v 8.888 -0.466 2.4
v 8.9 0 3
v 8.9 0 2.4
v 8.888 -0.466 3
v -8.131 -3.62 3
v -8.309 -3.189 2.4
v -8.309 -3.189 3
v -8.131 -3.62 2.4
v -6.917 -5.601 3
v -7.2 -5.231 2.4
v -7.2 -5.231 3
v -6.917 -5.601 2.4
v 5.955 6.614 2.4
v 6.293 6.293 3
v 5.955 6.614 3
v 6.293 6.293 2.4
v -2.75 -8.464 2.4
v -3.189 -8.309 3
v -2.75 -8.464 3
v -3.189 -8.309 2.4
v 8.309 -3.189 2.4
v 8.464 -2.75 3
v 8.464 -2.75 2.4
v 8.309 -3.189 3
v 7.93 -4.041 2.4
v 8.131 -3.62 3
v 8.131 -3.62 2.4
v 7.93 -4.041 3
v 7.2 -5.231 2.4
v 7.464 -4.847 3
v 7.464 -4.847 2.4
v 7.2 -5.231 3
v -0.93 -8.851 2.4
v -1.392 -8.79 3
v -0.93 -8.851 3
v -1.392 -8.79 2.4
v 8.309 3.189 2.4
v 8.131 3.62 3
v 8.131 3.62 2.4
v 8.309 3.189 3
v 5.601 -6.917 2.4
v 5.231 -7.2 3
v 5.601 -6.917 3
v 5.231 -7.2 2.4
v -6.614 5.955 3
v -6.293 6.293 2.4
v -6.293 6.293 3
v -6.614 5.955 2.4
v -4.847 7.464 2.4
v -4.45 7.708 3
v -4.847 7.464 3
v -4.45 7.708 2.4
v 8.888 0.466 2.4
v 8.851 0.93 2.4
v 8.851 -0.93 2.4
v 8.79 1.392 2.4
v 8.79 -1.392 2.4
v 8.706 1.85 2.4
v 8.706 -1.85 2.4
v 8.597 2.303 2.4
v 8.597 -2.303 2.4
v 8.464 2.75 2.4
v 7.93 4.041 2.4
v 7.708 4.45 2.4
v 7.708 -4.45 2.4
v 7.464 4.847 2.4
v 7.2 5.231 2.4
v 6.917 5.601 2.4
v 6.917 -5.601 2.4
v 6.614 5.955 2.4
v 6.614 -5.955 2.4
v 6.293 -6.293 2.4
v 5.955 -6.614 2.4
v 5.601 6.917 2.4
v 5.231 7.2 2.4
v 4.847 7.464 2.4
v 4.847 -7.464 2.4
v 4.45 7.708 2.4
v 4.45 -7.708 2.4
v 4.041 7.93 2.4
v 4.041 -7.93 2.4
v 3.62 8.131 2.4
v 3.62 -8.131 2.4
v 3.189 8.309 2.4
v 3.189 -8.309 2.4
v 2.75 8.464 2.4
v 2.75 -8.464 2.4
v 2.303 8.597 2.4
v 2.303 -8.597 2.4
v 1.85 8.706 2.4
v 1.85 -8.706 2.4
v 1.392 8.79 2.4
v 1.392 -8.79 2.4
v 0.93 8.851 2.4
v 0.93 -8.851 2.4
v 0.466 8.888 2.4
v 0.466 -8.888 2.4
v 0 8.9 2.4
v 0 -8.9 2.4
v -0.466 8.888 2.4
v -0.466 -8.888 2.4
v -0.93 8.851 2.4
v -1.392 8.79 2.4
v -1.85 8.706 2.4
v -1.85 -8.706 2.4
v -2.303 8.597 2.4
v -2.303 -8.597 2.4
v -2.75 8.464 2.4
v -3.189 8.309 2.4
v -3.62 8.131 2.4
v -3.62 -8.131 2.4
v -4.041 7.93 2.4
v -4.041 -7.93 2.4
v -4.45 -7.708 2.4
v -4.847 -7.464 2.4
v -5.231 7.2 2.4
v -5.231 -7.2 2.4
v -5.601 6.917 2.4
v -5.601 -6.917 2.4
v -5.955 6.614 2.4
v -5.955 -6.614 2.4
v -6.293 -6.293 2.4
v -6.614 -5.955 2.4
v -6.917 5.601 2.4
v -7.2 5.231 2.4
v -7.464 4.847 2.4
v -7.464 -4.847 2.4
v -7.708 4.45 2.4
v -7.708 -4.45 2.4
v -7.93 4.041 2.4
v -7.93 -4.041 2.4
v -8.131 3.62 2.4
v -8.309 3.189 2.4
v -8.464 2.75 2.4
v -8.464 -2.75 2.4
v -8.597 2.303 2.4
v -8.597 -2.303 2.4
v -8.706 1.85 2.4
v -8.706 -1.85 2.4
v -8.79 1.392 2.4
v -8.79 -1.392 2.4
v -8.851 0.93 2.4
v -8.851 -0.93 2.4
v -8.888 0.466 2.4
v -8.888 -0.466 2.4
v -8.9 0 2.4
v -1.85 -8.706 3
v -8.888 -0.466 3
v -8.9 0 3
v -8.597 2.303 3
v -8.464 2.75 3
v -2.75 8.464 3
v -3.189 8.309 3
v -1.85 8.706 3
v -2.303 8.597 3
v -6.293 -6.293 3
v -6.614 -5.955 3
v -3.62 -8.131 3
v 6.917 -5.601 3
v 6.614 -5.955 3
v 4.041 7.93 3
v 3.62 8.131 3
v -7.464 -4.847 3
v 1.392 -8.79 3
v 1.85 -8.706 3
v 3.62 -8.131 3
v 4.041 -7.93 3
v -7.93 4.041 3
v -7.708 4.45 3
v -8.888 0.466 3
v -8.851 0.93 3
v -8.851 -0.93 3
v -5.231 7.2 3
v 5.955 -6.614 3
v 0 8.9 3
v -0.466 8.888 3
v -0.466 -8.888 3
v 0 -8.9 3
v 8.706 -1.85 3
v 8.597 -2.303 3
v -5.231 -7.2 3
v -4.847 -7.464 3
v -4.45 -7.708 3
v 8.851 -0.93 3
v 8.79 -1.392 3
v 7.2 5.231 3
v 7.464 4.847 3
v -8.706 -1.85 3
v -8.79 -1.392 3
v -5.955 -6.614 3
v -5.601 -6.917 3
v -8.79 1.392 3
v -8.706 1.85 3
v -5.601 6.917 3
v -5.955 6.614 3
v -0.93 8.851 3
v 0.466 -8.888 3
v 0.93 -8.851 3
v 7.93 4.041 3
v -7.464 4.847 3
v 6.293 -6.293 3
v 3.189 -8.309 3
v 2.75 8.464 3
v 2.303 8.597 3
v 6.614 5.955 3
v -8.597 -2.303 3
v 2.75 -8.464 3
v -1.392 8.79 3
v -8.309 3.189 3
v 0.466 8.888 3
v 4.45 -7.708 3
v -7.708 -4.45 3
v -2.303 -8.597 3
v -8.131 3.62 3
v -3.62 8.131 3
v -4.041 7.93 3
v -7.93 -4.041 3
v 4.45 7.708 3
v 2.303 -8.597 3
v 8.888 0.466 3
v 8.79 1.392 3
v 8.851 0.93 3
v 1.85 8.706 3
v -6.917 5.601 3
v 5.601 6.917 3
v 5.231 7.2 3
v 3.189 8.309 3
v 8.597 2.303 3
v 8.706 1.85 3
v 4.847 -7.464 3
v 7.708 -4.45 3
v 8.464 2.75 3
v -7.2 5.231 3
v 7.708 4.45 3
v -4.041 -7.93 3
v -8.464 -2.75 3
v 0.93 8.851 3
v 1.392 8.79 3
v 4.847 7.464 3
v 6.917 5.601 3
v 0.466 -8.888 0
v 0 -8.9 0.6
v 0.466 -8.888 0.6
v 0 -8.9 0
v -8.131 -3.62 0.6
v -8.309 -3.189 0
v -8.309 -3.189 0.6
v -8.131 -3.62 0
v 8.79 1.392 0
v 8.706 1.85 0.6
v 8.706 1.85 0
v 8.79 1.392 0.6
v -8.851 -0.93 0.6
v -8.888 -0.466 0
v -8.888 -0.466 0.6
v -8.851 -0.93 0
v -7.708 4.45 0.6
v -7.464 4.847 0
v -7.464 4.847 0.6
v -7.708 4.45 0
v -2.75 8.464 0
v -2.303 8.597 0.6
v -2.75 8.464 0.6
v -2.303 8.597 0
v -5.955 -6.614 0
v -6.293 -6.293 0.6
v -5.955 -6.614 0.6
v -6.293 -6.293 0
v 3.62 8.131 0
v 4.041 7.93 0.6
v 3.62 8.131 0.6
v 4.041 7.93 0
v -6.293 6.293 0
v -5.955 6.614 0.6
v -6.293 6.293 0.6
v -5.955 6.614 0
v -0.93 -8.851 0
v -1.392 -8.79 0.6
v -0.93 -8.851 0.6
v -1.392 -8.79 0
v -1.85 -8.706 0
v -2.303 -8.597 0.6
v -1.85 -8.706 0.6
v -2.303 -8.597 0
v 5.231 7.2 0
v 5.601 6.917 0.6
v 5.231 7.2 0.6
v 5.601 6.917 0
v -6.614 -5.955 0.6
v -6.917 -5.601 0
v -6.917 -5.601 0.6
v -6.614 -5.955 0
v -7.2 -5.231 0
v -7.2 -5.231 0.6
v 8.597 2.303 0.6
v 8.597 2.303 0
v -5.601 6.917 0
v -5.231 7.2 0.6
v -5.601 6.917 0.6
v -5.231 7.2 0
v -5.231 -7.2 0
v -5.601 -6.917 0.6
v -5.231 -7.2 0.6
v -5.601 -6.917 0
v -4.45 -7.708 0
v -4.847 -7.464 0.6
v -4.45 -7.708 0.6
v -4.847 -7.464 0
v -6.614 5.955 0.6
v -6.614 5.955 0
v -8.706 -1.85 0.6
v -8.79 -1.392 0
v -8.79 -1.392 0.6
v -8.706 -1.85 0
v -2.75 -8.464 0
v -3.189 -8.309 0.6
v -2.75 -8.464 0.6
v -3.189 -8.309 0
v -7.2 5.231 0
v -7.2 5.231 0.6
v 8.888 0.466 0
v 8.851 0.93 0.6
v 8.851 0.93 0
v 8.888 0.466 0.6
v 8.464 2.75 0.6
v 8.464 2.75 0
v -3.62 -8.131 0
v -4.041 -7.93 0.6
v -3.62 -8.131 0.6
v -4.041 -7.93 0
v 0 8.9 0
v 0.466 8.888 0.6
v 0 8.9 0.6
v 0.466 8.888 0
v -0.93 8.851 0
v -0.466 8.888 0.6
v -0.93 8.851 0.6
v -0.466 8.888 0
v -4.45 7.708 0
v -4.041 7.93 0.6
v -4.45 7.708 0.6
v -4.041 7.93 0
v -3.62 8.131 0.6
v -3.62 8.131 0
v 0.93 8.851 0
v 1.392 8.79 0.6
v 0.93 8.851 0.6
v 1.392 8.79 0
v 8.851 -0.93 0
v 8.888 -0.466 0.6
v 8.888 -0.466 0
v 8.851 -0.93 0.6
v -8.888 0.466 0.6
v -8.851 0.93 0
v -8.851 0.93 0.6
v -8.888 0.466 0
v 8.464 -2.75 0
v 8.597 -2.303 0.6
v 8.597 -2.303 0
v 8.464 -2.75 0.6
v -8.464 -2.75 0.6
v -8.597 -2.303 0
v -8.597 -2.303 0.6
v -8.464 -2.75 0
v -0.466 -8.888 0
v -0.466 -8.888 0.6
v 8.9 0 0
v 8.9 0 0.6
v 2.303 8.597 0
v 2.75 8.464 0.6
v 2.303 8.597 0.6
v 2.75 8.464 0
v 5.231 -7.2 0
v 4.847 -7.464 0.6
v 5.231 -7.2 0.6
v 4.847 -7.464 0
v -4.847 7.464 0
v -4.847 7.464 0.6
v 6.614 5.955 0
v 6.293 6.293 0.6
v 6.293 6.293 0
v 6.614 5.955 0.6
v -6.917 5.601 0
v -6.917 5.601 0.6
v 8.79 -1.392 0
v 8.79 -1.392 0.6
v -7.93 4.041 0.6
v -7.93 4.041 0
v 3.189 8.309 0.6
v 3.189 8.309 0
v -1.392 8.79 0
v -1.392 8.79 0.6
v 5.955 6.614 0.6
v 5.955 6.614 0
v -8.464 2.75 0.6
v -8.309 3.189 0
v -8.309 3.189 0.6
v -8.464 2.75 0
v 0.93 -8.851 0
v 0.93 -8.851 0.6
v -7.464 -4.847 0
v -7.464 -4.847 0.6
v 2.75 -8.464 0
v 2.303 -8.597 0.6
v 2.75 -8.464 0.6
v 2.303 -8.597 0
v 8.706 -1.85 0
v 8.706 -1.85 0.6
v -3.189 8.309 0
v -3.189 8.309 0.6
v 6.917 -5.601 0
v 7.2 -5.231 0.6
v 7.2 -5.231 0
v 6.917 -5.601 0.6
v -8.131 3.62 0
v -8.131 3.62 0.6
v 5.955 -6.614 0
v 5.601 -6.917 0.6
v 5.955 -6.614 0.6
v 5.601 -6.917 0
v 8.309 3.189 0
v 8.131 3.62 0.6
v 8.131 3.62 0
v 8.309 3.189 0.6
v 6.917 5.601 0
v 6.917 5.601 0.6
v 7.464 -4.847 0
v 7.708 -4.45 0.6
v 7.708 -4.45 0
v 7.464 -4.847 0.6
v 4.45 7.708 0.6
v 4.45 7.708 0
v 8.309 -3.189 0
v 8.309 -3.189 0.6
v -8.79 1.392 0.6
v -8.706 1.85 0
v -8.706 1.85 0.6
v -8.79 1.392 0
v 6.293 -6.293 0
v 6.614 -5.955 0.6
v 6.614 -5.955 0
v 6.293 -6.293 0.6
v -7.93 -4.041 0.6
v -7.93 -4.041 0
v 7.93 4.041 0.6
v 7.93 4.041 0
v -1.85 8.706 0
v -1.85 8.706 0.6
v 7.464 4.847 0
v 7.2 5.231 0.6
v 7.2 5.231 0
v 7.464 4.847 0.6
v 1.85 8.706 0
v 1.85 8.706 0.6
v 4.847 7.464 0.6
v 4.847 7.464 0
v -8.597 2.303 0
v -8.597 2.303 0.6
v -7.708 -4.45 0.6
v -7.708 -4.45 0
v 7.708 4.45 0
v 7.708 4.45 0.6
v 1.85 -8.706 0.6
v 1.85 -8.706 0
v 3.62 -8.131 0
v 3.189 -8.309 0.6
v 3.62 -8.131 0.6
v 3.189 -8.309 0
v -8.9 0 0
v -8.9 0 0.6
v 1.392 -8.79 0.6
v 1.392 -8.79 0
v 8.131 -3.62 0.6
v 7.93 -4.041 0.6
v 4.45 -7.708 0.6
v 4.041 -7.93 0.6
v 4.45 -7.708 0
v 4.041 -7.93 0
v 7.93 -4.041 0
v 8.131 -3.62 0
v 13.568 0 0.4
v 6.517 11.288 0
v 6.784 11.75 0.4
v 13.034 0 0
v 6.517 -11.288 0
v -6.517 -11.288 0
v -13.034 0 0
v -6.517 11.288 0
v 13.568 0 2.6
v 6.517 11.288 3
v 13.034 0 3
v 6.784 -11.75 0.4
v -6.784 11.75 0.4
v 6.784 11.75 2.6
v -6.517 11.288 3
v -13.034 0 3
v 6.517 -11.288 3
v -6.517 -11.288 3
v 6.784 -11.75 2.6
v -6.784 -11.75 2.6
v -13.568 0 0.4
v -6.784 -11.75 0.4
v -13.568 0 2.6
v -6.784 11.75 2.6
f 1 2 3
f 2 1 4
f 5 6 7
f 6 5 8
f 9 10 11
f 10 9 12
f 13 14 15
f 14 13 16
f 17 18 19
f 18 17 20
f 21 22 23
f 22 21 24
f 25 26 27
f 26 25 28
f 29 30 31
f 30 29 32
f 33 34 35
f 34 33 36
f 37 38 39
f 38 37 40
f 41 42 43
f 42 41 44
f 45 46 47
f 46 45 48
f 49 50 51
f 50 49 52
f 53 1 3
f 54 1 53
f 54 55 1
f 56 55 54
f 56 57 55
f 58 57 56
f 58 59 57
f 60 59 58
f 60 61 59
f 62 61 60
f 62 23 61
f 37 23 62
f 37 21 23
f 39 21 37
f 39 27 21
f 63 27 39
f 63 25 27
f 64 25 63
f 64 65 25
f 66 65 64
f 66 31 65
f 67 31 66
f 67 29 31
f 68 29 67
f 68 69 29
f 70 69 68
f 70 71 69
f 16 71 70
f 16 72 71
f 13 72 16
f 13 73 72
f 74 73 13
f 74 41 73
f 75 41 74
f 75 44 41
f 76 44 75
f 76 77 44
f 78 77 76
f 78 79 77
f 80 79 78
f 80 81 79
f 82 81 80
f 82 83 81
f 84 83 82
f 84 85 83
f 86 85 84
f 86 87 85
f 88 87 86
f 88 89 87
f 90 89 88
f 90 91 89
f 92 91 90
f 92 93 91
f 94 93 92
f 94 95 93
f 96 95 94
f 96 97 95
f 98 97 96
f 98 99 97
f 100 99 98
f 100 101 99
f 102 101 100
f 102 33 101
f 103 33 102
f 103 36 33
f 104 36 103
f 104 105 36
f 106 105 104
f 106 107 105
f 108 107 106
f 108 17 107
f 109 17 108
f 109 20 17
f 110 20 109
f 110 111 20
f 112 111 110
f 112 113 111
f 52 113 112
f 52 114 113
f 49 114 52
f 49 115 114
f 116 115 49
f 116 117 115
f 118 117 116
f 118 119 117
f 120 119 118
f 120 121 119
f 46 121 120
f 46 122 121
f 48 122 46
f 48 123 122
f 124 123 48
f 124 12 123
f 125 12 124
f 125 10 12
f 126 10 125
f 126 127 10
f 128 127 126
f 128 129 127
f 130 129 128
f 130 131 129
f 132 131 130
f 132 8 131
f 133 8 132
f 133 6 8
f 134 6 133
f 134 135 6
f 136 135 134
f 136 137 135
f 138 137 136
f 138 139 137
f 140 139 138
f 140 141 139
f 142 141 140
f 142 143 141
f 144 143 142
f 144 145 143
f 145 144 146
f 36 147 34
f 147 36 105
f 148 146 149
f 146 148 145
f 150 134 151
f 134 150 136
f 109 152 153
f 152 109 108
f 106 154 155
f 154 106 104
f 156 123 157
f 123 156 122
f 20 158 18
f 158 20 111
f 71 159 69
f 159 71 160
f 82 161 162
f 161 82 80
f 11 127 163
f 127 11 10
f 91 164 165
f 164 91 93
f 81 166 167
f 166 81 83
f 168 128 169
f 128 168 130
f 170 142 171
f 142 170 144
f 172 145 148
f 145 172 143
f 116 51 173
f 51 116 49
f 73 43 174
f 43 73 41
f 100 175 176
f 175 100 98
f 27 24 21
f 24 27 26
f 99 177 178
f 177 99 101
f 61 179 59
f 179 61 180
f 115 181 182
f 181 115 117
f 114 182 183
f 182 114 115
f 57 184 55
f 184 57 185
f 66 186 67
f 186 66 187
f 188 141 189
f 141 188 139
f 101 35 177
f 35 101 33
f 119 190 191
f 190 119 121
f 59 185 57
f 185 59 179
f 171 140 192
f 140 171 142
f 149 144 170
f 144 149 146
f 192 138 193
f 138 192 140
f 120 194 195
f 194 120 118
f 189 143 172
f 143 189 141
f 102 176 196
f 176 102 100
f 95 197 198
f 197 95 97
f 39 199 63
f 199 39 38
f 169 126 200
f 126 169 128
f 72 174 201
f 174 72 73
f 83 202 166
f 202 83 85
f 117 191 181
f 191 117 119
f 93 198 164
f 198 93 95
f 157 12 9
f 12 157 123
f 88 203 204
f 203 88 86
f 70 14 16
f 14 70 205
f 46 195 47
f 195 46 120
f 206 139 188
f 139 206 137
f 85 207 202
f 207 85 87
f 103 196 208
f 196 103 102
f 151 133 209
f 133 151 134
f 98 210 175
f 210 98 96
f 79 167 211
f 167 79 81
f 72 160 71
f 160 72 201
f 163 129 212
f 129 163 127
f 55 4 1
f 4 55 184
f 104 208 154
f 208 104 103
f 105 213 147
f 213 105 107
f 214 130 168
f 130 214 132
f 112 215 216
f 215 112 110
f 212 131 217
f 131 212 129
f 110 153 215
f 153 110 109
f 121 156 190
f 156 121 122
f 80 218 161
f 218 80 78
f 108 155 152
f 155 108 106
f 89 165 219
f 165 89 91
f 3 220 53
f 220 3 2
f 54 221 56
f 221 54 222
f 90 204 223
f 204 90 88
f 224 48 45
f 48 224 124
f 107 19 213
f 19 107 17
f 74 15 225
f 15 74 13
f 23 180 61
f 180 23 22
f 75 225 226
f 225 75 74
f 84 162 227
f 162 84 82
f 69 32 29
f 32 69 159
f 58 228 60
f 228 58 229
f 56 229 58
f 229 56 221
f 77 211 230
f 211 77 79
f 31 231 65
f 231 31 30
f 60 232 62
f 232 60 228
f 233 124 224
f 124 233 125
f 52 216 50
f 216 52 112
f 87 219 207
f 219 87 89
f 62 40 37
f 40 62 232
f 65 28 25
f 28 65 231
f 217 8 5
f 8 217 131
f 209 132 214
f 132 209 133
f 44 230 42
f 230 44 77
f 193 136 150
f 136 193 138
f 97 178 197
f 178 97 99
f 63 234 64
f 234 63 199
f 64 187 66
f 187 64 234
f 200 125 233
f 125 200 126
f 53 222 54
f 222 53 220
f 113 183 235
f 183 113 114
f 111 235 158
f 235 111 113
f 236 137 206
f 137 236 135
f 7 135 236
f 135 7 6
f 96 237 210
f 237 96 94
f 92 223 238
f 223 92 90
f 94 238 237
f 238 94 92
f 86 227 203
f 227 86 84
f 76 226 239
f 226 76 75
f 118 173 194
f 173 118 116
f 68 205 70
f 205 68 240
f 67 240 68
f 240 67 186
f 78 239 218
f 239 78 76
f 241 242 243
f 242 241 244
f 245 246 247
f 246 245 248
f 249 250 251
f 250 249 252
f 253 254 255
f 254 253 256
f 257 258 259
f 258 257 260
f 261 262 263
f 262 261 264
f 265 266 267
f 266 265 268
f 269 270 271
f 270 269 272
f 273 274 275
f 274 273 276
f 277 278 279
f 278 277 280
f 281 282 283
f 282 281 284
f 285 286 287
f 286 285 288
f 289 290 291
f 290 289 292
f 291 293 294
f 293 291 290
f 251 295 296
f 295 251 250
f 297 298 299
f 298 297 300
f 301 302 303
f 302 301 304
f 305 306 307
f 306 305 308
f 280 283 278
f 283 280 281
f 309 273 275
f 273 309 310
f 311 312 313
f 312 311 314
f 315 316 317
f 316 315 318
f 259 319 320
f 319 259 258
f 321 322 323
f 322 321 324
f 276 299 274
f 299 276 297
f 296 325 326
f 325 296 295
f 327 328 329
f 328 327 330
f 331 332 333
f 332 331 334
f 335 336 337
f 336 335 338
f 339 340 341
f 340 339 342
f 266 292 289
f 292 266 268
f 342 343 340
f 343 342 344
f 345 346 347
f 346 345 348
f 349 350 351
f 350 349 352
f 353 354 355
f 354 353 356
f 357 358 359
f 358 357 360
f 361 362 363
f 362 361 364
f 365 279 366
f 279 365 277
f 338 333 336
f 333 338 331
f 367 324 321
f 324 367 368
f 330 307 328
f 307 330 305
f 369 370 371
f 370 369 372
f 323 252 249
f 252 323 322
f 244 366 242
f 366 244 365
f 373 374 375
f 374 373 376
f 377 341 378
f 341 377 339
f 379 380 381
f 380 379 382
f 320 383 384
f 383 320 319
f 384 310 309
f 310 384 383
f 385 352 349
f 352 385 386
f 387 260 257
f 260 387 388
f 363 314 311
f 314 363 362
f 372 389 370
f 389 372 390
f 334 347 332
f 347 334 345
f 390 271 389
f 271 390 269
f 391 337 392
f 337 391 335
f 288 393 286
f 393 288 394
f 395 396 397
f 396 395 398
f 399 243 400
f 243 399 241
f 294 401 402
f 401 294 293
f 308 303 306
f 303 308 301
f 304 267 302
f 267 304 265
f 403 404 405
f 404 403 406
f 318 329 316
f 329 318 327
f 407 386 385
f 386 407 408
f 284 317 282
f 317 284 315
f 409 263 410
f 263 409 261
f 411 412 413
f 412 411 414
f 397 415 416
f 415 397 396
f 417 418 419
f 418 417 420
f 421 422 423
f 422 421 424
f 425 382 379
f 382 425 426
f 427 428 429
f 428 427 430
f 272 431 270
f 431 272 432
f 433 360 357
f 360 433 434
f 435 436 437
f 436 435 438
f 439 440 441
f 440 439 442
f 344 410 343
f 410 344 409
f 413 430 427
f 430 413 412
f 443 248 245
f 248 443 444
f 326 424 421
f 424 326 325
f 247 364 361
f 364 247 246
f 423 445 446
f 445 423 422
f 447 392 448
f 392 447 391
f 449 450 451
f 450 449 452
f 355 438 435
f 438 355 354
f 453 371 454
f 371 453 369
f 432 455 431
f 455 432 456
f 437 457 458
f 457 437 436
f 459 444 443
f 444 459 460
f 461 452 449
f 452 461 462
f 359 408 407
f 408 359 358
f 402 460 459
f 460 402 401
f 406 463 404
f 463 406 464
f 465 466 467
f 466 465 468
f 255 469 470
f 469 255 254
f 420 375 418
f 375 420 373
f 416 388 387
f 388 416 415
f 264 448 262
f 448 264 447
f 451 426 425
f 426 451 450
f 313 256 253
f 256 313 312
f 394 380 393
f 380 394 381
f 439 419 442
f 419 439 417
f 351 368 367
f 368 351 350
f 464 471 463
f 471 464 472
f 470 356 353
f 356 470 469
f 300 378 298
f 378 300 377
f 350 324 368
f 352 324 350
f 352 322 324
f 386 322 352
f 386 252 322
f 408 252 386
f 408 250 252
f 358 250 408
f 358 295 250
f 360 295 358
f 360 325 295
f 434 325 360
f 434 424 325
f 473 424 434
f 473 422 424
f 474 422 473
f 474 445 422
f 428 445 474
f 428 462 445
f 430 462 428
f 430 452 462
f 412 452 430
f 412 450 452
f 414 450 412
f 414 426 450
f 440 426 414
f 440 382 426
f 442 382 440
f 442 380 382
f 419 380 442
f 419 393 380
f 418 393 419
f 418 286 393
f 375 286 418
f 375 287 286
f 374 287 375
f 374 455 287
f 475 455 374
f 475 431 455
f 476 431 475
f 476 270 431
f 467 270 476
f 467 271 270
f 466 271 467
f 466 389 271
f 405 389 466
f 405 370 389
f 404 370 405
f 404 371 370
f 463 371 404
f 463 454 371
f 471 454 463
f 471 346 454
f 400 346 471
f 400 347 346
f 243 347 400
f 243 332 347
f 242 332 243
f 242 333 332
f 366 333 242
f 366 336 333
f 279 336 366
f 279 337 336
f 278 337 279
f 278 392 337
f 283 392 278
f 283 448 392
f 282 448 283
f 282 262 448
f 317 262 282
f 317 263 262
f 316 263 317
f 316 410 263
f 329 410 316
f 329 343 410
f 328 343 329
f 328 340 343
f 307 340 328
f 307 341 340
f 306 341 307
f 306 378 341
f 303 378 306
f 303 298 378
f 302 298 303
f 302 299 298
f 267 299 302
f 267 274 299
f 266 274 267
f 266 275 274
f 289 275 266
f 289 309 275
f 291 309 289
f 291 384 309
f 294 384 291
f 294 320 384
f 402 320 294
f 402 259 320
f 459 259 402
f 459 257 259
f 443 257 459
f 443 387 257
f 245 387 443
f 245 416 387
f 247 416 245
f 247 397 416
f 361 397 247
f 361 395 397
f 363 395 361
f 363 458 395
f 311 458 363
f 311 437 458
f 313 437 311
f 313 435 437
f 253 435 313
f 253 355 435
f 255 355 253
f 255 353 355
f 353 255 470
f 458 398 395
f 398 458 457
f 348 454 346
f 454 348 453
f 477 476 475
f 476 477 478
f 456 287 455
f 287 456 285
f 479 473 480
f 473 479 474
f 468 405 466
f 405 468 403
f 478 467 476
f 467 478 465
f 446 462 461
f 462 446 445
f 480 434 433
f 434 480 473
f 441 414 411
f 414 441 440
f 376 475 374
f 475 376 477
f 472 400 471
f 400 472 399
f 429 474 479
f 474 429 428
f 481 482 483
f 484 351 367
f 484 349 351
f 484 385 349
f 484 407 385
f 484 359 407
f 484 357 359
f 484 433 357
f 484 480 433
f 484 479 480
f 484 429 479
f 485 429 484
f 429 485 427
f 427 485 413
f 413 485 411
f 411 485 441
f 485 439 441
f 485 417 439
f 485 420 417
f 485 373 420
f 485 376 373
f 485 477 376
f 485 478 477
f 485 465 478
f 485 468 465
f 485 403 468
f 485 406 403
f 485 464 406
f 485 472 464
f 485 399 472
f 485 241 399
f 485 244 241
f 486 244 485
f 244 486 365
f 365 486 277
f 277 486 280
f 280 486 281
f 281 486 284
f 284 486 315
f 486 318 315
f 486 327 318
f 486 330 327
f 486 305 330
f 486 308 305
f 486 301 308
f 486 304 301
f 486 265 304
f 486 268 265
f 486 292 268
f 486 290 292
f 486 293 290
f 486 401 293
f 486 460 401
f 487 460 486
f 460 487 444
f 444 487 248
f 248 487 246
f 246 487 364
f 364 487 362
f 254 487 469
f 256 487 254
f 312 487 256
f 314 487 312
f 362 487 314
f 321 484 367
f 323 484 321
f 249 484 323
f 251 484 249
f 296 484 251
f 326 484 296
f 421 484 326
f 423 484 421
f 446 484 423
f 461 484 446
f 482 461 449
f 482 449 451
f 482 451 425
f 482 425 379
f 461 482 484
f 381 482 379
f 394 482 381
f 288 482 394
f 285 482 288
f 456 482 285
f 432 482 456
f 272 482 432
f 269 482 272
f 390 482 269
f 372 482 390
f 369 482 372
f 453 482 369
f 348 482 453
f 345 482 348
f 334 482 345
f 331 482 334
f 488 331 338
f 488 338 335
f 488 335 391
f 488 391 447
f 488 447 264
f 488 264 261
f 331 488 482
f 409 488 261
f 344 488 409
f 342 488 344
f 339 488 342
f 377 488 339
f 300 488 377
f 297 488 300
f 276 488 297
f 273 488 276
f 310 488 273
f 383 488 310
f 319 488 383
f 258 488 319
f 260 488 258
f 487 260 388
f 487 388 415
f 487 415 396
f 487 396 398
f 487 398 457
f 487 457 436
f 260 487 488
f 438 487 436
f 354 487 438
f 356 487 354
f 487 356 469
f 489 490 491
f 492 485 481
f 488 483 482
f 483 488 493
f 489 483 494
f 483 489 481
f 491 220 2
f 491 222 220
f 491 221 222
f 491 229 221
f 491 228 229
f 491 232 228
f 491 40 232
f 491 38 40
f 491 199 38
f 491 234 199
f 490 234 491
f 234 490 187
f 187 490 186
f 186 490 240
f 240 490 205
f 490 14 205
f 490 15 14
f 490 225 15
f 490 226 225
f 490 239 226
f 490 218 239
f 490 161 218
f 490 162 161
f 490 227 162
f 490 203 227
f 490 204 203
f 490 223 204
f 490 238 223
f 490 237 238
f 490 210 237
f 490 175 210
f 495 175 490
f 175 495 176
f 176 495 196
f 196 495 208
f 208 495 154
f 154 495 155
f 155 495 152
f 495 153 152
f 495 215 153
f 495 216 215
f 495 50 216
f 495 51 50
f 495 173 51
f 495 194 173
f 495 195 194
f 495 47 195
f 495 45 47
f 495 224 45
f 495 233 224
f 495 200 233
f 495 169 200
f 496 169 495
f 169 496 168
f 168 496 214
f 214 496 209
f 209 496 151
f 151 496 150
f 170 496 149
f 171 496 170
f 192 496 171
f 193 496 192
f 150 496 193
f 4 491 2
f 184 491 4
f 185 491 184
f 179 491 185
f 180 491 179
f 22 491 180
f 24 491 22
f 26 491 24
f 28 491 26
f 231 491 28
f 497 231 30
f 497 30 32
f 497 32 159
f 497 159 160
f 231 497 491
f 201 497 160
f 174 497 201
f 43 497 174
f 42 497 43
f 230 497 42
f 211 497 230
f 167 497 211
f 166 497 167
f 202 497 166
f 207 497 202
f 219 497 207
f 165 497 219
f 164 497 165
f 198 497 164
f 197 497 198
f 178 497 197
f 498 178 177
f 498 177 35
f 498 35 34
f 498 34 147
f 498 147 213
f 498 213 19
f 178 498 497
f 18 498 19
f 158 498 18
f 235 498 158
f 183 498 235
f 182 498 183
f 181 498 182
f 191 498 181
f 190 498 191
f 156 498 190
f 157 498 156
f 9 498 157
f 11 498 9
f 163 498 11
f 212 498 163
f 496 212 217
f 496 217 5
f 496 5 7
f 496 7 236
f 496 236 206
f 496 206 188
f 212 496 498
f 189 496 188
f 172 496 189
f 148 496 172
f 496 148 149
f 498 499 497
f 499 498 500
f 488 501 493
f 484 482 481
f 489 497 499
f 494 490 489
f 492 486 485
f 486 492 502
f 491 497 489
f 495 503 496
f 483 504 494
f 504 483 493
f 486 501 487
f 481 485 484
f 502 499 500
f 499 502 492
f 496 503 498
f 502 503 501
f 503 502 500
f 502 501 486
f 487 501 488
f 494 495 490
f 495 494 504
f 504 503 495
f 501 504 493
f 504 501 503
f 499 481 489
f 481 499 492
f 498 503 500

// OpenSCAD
// ============================================================================
// Star Wars: Rebellion — Rebel hex token, 3D printable
// 23.5mm flat-to-flat hexagon (corners at 3 and 9 o'clock), 3.0mm thick.
// Light grey body; on BOTH faces a black disc carrying the red Rebel
// starbird. The faces are otherwise flat (the faint circle visible around
// the disc on the original is a printing effect, not a physical feature).
// The bottom face is mirrored so it reads correctly when flipped.
//
// part = "token"        -> printable body (grey): disc recessed 0.6mm both faces
//        "inlay_black"  -> exact-complement inlay: disc minus starbird
//        "inlay_red"    -> exact-complement inlay: the starbird
//        "face"         -> 2D layout check
//        "audit_black" / "audit_red" -> bare 2D colour masks for the audit
//        "preview"      -> coloured OpenCSG preview (top face)
// half = "top" | "bottom" -> that half only (cut at 1.5mm), laid art-face down for
//        printing on the bed; glue the flat faces. Works with every 3D part above.
// Art: starbird path from the public-domain Wikimedia
// "Flag of the Rebel Alliance.svg", extracted to rebel_starbird.svg.
// ============================================================================

/* [Selection] */
part = "token";

/* [Token] */
flat_to_flat = 23.5; // across flats
thickness = 3.0;
chamfer = 0.4;       // edge chamfer top and bottom, also fights elephant-foot
engrave = 0.6;       // inlay depth per face (3 layers @ 0.2mm)
art_min_feature = 0.25; // drop starbird slivers thinner than this

/* [Split for gluing] */
half = "none";       // "none" = whole token. "top" / "bottom" = only that half, cut at
                     // mid-thickness and laid art-face DOWN so the inlays print on the
                     // bed; glue the two flat faces together afterwards.

/* [Art] (measured from the photo of the original) */
disc_R = 8.9;        // black disc radius
star_R = 7.8;        // radius of the starbird's circle (the SVG's circle is 300 units)
star_svg = "../art/rebel_starbird.svg";
star_svg_units = 300;      // circle radius in SVG units
star_svg_cy = -5.98;       // circle centre below the bbox centre (SVG units, y up)

$fa = 3; $fs = 0.25;
eps = 0.01;

hex_R = flat_to_flat / 2 / cos(30);  // corner radius (13.568)
T = thickness;

// ---------------------------------------------------------------- blank
module hex2d(r) { circle(r = r, $fn = 6); }   // corners at 0/60/...: flats top+bottom

module blank() {
    hull() {
        translate([0, 0, chamfer]) linear_extrude(T - 2 * chamfer) hex2d(hex_R);
        linear_extrude(T) offset(delta = -chamfer / cos(30)) hex2d(hex_R);
    }
}

module opening(m) { offset(delta = m / 2) offset(delta = -m / 2) children(); }

// ---------------------------------------------------------------- art
star_s = star_R / star_svg_units;
module starbird2d() {
    opening(art_min_feature)
        scale(star_s) translate([0, -star_svg_cy])
            import(star_svg, center = true, dpi = 25.4);
}
module red2d()   { starbird2d(); }
module black2d() { difference() { circle(r = disc_R); starbird2d(); } }
module recess2d() { circle(r = disc_R); }              // the inlay pocket

// ---------------------------------------------------------------- 3D
// cutters for both faces; bottom mirrored left-right
module both_faces(h = engrave) {
    translate([0, 0, T - h]) linear_extrude(h + eps) children();
    translate([0, 0, -eps]) linear_extrude(h + eps) mirror([1, 0]) children();
}
module cut_recess() { both_faces() recess2d(); }
module cut_black()  { both_faces() black2d(); }
module cut_red()    { both_faces() red2d(); }


// ---------------------------------------------------------------- halves
// Cut at T/2. "bottom" keeps z in [0, T/2] as is (its art is already at z=0).
// "top" keeps z in [T/2, T] and turns it over (a rotation, not a mirror, so it is
// the same physical piece) to put the top-face art on the bed.
module halve() {
    if (half == "bottom")
        difference() { children(); translate([0, 0, T / 2]) linear_extrude(T) square(200, center = true); }
    else if (half == "top")
        translate([0, 0, T]) rotate([180, 0, 0])
            difference() { children(); translate([0, 0, -T / 2]) linear_extrude(T) square(200, center = true); }
    else children();
}

module token() { difference() { blank(); cut_recess(); } }

module below() { translate([0, 0, -1 - eps]) linear_extrude(1) hex2d(hex_R + 5); }
module above() { translate([0, 0, T + eps]) linear_extrude(1) hex2d(hex_R + 5); }

if (part == "token") halve() token();
else if (part == "inlay_black") halve() intersection() { blank(); cut_black(); }
else if (part == "inlay_red")   halve() intersection() { blank(); cut_red(); }
else if (part == "face") {
    difference() { hex2d(hex_R); offset(delta = -0.15) hex2d(hex_R); }
    black2d(); red2d();
}
else if (part == "audit_black") black2d();
else if (part == "audit_red")   red2d();
else if (part == "preview") halve() {   // difference-only so OpenCSG shows it; the red is
    color([0.78, 0.78, 0.8]) token();   // drawn 0.03mm proud to avoid z-fighting
    color([0.08, 0.08, 0.09]) difference() { cut_black(); above(); below(); }
    color([0.8, 0.12, 0.12]) both_faces(engrave + 0.03) red2d();
}
